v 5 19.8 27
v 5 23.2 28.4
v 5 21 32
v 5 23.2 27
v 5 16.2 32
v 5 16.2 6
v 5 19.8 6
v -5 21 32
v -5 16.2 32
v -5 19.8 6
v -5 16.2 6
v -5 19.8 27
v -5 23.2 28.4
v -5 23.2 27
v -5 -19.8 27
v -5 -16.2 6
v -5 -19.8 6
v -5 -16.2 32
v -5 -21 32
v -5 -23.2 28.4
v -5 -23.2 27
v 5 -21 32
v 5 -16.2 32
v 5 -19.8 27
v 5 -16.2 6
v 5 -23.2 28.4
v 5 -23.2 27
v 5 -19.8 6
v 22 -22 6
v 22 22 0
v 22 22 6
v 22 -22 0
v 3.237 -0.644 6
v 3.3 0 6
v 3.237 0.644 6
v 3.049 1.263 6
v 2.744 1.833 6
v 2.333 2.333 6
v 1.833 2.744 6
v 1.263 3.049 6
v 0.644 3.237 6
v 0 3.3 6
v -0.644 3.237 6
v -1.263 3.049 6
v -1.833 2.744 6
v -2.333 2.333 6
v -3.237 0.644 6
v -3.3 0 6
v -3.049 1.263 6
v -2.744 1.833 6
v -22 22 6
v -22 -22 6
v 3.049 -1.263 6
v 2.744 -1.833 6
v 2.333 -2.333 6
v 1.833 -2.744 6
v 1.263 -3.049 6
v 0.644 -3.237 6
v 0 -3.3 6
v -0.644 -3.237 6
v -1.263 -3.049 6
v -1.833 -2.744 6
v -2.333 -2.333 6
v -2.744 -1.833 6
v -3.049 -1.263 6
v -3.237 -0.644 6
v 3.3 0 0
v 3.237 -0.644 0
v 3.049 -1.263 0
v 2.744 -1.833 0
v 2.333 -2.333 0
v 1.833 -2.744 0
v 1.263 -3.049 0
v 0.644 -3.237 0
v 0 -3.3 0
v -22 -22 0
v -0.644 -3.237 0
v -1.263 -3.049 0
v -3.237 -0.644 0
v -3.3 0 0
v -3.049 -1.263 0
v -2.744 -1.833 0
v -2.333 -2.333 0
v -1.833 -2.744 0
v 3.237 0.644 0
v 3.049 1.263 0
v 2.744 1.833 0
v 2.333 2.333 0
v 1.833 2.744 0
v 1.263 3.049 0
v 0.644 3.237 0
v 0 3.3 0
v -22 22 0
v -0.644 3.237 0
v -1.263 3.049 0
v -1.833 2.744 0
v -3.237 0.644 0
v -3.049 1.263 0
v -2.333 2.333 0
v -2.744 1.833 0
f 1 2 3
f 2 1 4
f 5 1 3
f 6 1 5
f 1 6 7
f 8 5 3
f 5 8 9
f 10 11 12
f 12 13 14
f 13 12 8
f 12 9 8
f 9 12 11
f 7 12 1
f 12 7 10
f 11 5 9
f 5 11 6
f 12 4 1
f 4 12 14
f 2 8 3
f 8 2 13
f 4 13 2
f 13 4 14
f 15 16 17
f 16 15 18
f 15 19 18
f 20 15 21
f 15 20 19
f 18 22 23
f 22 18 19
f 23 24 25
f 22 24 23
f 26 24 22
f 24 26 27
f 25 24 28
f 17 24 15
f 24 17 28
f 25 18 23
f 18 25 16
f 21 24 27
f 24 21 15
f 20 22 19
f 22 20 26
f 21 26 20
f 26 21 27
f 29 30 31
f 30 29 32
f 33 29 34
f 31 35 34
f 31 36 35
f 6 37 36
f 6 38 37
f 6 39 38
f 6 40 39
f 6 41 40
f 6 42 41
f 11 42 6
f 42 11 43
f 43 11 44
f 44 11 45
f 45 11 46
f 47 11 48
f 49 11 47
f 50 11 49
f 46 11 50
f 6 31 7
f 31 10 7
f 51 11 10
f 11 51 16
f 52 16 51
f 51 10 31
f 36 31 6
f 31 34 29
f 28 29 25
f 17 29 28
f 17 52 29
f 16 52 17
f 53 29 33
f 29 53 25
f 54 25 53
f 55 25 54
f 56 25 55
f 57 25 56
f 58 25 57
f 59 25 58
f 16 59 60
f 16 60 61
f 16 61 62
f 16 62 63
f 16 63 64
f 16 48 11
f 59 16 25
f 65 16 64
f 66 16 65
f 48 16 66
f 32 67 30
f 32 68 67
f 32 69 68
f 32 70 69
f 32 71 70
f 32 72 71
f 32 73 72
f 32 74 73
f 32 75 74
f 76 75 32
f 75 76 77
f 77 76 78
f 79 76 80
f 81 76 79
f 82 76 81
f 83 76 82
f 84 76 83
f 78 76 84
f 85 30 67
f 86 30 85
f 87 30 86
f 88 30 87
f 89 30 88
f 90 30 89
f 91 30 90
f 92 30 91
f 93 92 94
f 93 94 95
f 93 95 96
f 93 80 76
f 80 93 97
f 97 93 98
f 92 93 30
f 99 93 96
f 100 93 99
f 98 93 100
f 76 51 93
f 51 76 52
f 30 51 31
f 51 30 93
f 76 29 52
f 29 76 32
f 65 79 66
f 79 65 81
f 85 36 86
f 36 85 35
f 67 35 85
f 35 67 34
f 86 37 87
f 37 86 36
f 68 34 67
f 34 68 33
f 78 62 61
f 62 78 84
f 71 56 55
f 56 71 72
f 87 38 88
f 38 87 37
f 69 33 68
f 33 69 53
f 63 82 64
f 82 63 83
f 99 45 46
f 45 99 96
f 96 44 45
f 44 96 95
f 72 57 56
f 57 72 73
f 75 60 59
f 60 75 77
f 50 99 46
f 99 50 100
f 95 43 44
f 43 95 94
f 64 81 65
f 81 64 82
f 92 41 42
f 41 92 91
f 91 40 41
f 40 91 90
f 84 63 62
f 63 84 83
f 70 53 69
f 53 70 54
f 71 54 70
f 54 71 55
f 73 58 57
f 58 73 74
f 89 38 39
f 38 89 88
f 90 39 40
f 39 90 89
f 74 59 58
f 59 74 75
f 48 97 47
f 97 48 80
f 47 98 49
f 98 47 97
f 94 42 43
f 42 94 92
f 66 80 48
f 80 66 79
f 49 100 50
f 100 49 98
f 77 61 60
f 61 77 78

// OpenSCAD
$fn = 32;

// ----------------------------------------------------------------------
// Snap-fit latch: 2 arms, 26 mm tall, 3.6 mm undercut hooks
// ----------------------------------------------------------------------

// --- parameters (mm) ---
base_d = 44;              // base plate depth
base_h = 6;               // base plate thickness
span = 36;                // distance between opposite arms
arm_t = 3.6;              // arm thickness
arm_d = 10;               // arm width
height = 26;              // free arm length
head_len = 3.6;           // hook reach
head_h = 5;               // hook height
lead = 1.4;               // lead-in ramp thickness
bore_d = 6.6;             // base fixing bore
top_z = 32;               // height of the arm tips above the base

arms = 2;

difference() {
  union() {
    /* base plate, centred on the arm ring */
    translate([-22, -22, 0]) cube([base_d, base_d, base_h]);
    for (a = [0 : 360 / arms : 359]) rotate([0, 0, a]) {
    /* arm, sunk 0.5 mm into the base */
    translate([-arm_d / 2, span / 2 - arm_t / 2, base_h - 0.5]) cube([arm_d, arm_t, height + 0.5]);
    /* hook: a convex hull of a tall inner block and a thin outer lip
       gives a flat undercut below and a lead-in ramp on top */
    hull() {
      translate([-arm_d / 2, span / 2 + arm_t / 2 - 0.6, top_z - head_h]) cube([arm_d, lead + 0.4, head_h]);
      translate([-arm_d / 2, span / 2 + arm_t / 2 - 0.2, top_z - head_h]) cube([arm_d, head_len, lead]);
    }
    }
  }
  translate([0, 0, -2.5]) cylinder(h = base_h + 5, d = bore_d);
}
